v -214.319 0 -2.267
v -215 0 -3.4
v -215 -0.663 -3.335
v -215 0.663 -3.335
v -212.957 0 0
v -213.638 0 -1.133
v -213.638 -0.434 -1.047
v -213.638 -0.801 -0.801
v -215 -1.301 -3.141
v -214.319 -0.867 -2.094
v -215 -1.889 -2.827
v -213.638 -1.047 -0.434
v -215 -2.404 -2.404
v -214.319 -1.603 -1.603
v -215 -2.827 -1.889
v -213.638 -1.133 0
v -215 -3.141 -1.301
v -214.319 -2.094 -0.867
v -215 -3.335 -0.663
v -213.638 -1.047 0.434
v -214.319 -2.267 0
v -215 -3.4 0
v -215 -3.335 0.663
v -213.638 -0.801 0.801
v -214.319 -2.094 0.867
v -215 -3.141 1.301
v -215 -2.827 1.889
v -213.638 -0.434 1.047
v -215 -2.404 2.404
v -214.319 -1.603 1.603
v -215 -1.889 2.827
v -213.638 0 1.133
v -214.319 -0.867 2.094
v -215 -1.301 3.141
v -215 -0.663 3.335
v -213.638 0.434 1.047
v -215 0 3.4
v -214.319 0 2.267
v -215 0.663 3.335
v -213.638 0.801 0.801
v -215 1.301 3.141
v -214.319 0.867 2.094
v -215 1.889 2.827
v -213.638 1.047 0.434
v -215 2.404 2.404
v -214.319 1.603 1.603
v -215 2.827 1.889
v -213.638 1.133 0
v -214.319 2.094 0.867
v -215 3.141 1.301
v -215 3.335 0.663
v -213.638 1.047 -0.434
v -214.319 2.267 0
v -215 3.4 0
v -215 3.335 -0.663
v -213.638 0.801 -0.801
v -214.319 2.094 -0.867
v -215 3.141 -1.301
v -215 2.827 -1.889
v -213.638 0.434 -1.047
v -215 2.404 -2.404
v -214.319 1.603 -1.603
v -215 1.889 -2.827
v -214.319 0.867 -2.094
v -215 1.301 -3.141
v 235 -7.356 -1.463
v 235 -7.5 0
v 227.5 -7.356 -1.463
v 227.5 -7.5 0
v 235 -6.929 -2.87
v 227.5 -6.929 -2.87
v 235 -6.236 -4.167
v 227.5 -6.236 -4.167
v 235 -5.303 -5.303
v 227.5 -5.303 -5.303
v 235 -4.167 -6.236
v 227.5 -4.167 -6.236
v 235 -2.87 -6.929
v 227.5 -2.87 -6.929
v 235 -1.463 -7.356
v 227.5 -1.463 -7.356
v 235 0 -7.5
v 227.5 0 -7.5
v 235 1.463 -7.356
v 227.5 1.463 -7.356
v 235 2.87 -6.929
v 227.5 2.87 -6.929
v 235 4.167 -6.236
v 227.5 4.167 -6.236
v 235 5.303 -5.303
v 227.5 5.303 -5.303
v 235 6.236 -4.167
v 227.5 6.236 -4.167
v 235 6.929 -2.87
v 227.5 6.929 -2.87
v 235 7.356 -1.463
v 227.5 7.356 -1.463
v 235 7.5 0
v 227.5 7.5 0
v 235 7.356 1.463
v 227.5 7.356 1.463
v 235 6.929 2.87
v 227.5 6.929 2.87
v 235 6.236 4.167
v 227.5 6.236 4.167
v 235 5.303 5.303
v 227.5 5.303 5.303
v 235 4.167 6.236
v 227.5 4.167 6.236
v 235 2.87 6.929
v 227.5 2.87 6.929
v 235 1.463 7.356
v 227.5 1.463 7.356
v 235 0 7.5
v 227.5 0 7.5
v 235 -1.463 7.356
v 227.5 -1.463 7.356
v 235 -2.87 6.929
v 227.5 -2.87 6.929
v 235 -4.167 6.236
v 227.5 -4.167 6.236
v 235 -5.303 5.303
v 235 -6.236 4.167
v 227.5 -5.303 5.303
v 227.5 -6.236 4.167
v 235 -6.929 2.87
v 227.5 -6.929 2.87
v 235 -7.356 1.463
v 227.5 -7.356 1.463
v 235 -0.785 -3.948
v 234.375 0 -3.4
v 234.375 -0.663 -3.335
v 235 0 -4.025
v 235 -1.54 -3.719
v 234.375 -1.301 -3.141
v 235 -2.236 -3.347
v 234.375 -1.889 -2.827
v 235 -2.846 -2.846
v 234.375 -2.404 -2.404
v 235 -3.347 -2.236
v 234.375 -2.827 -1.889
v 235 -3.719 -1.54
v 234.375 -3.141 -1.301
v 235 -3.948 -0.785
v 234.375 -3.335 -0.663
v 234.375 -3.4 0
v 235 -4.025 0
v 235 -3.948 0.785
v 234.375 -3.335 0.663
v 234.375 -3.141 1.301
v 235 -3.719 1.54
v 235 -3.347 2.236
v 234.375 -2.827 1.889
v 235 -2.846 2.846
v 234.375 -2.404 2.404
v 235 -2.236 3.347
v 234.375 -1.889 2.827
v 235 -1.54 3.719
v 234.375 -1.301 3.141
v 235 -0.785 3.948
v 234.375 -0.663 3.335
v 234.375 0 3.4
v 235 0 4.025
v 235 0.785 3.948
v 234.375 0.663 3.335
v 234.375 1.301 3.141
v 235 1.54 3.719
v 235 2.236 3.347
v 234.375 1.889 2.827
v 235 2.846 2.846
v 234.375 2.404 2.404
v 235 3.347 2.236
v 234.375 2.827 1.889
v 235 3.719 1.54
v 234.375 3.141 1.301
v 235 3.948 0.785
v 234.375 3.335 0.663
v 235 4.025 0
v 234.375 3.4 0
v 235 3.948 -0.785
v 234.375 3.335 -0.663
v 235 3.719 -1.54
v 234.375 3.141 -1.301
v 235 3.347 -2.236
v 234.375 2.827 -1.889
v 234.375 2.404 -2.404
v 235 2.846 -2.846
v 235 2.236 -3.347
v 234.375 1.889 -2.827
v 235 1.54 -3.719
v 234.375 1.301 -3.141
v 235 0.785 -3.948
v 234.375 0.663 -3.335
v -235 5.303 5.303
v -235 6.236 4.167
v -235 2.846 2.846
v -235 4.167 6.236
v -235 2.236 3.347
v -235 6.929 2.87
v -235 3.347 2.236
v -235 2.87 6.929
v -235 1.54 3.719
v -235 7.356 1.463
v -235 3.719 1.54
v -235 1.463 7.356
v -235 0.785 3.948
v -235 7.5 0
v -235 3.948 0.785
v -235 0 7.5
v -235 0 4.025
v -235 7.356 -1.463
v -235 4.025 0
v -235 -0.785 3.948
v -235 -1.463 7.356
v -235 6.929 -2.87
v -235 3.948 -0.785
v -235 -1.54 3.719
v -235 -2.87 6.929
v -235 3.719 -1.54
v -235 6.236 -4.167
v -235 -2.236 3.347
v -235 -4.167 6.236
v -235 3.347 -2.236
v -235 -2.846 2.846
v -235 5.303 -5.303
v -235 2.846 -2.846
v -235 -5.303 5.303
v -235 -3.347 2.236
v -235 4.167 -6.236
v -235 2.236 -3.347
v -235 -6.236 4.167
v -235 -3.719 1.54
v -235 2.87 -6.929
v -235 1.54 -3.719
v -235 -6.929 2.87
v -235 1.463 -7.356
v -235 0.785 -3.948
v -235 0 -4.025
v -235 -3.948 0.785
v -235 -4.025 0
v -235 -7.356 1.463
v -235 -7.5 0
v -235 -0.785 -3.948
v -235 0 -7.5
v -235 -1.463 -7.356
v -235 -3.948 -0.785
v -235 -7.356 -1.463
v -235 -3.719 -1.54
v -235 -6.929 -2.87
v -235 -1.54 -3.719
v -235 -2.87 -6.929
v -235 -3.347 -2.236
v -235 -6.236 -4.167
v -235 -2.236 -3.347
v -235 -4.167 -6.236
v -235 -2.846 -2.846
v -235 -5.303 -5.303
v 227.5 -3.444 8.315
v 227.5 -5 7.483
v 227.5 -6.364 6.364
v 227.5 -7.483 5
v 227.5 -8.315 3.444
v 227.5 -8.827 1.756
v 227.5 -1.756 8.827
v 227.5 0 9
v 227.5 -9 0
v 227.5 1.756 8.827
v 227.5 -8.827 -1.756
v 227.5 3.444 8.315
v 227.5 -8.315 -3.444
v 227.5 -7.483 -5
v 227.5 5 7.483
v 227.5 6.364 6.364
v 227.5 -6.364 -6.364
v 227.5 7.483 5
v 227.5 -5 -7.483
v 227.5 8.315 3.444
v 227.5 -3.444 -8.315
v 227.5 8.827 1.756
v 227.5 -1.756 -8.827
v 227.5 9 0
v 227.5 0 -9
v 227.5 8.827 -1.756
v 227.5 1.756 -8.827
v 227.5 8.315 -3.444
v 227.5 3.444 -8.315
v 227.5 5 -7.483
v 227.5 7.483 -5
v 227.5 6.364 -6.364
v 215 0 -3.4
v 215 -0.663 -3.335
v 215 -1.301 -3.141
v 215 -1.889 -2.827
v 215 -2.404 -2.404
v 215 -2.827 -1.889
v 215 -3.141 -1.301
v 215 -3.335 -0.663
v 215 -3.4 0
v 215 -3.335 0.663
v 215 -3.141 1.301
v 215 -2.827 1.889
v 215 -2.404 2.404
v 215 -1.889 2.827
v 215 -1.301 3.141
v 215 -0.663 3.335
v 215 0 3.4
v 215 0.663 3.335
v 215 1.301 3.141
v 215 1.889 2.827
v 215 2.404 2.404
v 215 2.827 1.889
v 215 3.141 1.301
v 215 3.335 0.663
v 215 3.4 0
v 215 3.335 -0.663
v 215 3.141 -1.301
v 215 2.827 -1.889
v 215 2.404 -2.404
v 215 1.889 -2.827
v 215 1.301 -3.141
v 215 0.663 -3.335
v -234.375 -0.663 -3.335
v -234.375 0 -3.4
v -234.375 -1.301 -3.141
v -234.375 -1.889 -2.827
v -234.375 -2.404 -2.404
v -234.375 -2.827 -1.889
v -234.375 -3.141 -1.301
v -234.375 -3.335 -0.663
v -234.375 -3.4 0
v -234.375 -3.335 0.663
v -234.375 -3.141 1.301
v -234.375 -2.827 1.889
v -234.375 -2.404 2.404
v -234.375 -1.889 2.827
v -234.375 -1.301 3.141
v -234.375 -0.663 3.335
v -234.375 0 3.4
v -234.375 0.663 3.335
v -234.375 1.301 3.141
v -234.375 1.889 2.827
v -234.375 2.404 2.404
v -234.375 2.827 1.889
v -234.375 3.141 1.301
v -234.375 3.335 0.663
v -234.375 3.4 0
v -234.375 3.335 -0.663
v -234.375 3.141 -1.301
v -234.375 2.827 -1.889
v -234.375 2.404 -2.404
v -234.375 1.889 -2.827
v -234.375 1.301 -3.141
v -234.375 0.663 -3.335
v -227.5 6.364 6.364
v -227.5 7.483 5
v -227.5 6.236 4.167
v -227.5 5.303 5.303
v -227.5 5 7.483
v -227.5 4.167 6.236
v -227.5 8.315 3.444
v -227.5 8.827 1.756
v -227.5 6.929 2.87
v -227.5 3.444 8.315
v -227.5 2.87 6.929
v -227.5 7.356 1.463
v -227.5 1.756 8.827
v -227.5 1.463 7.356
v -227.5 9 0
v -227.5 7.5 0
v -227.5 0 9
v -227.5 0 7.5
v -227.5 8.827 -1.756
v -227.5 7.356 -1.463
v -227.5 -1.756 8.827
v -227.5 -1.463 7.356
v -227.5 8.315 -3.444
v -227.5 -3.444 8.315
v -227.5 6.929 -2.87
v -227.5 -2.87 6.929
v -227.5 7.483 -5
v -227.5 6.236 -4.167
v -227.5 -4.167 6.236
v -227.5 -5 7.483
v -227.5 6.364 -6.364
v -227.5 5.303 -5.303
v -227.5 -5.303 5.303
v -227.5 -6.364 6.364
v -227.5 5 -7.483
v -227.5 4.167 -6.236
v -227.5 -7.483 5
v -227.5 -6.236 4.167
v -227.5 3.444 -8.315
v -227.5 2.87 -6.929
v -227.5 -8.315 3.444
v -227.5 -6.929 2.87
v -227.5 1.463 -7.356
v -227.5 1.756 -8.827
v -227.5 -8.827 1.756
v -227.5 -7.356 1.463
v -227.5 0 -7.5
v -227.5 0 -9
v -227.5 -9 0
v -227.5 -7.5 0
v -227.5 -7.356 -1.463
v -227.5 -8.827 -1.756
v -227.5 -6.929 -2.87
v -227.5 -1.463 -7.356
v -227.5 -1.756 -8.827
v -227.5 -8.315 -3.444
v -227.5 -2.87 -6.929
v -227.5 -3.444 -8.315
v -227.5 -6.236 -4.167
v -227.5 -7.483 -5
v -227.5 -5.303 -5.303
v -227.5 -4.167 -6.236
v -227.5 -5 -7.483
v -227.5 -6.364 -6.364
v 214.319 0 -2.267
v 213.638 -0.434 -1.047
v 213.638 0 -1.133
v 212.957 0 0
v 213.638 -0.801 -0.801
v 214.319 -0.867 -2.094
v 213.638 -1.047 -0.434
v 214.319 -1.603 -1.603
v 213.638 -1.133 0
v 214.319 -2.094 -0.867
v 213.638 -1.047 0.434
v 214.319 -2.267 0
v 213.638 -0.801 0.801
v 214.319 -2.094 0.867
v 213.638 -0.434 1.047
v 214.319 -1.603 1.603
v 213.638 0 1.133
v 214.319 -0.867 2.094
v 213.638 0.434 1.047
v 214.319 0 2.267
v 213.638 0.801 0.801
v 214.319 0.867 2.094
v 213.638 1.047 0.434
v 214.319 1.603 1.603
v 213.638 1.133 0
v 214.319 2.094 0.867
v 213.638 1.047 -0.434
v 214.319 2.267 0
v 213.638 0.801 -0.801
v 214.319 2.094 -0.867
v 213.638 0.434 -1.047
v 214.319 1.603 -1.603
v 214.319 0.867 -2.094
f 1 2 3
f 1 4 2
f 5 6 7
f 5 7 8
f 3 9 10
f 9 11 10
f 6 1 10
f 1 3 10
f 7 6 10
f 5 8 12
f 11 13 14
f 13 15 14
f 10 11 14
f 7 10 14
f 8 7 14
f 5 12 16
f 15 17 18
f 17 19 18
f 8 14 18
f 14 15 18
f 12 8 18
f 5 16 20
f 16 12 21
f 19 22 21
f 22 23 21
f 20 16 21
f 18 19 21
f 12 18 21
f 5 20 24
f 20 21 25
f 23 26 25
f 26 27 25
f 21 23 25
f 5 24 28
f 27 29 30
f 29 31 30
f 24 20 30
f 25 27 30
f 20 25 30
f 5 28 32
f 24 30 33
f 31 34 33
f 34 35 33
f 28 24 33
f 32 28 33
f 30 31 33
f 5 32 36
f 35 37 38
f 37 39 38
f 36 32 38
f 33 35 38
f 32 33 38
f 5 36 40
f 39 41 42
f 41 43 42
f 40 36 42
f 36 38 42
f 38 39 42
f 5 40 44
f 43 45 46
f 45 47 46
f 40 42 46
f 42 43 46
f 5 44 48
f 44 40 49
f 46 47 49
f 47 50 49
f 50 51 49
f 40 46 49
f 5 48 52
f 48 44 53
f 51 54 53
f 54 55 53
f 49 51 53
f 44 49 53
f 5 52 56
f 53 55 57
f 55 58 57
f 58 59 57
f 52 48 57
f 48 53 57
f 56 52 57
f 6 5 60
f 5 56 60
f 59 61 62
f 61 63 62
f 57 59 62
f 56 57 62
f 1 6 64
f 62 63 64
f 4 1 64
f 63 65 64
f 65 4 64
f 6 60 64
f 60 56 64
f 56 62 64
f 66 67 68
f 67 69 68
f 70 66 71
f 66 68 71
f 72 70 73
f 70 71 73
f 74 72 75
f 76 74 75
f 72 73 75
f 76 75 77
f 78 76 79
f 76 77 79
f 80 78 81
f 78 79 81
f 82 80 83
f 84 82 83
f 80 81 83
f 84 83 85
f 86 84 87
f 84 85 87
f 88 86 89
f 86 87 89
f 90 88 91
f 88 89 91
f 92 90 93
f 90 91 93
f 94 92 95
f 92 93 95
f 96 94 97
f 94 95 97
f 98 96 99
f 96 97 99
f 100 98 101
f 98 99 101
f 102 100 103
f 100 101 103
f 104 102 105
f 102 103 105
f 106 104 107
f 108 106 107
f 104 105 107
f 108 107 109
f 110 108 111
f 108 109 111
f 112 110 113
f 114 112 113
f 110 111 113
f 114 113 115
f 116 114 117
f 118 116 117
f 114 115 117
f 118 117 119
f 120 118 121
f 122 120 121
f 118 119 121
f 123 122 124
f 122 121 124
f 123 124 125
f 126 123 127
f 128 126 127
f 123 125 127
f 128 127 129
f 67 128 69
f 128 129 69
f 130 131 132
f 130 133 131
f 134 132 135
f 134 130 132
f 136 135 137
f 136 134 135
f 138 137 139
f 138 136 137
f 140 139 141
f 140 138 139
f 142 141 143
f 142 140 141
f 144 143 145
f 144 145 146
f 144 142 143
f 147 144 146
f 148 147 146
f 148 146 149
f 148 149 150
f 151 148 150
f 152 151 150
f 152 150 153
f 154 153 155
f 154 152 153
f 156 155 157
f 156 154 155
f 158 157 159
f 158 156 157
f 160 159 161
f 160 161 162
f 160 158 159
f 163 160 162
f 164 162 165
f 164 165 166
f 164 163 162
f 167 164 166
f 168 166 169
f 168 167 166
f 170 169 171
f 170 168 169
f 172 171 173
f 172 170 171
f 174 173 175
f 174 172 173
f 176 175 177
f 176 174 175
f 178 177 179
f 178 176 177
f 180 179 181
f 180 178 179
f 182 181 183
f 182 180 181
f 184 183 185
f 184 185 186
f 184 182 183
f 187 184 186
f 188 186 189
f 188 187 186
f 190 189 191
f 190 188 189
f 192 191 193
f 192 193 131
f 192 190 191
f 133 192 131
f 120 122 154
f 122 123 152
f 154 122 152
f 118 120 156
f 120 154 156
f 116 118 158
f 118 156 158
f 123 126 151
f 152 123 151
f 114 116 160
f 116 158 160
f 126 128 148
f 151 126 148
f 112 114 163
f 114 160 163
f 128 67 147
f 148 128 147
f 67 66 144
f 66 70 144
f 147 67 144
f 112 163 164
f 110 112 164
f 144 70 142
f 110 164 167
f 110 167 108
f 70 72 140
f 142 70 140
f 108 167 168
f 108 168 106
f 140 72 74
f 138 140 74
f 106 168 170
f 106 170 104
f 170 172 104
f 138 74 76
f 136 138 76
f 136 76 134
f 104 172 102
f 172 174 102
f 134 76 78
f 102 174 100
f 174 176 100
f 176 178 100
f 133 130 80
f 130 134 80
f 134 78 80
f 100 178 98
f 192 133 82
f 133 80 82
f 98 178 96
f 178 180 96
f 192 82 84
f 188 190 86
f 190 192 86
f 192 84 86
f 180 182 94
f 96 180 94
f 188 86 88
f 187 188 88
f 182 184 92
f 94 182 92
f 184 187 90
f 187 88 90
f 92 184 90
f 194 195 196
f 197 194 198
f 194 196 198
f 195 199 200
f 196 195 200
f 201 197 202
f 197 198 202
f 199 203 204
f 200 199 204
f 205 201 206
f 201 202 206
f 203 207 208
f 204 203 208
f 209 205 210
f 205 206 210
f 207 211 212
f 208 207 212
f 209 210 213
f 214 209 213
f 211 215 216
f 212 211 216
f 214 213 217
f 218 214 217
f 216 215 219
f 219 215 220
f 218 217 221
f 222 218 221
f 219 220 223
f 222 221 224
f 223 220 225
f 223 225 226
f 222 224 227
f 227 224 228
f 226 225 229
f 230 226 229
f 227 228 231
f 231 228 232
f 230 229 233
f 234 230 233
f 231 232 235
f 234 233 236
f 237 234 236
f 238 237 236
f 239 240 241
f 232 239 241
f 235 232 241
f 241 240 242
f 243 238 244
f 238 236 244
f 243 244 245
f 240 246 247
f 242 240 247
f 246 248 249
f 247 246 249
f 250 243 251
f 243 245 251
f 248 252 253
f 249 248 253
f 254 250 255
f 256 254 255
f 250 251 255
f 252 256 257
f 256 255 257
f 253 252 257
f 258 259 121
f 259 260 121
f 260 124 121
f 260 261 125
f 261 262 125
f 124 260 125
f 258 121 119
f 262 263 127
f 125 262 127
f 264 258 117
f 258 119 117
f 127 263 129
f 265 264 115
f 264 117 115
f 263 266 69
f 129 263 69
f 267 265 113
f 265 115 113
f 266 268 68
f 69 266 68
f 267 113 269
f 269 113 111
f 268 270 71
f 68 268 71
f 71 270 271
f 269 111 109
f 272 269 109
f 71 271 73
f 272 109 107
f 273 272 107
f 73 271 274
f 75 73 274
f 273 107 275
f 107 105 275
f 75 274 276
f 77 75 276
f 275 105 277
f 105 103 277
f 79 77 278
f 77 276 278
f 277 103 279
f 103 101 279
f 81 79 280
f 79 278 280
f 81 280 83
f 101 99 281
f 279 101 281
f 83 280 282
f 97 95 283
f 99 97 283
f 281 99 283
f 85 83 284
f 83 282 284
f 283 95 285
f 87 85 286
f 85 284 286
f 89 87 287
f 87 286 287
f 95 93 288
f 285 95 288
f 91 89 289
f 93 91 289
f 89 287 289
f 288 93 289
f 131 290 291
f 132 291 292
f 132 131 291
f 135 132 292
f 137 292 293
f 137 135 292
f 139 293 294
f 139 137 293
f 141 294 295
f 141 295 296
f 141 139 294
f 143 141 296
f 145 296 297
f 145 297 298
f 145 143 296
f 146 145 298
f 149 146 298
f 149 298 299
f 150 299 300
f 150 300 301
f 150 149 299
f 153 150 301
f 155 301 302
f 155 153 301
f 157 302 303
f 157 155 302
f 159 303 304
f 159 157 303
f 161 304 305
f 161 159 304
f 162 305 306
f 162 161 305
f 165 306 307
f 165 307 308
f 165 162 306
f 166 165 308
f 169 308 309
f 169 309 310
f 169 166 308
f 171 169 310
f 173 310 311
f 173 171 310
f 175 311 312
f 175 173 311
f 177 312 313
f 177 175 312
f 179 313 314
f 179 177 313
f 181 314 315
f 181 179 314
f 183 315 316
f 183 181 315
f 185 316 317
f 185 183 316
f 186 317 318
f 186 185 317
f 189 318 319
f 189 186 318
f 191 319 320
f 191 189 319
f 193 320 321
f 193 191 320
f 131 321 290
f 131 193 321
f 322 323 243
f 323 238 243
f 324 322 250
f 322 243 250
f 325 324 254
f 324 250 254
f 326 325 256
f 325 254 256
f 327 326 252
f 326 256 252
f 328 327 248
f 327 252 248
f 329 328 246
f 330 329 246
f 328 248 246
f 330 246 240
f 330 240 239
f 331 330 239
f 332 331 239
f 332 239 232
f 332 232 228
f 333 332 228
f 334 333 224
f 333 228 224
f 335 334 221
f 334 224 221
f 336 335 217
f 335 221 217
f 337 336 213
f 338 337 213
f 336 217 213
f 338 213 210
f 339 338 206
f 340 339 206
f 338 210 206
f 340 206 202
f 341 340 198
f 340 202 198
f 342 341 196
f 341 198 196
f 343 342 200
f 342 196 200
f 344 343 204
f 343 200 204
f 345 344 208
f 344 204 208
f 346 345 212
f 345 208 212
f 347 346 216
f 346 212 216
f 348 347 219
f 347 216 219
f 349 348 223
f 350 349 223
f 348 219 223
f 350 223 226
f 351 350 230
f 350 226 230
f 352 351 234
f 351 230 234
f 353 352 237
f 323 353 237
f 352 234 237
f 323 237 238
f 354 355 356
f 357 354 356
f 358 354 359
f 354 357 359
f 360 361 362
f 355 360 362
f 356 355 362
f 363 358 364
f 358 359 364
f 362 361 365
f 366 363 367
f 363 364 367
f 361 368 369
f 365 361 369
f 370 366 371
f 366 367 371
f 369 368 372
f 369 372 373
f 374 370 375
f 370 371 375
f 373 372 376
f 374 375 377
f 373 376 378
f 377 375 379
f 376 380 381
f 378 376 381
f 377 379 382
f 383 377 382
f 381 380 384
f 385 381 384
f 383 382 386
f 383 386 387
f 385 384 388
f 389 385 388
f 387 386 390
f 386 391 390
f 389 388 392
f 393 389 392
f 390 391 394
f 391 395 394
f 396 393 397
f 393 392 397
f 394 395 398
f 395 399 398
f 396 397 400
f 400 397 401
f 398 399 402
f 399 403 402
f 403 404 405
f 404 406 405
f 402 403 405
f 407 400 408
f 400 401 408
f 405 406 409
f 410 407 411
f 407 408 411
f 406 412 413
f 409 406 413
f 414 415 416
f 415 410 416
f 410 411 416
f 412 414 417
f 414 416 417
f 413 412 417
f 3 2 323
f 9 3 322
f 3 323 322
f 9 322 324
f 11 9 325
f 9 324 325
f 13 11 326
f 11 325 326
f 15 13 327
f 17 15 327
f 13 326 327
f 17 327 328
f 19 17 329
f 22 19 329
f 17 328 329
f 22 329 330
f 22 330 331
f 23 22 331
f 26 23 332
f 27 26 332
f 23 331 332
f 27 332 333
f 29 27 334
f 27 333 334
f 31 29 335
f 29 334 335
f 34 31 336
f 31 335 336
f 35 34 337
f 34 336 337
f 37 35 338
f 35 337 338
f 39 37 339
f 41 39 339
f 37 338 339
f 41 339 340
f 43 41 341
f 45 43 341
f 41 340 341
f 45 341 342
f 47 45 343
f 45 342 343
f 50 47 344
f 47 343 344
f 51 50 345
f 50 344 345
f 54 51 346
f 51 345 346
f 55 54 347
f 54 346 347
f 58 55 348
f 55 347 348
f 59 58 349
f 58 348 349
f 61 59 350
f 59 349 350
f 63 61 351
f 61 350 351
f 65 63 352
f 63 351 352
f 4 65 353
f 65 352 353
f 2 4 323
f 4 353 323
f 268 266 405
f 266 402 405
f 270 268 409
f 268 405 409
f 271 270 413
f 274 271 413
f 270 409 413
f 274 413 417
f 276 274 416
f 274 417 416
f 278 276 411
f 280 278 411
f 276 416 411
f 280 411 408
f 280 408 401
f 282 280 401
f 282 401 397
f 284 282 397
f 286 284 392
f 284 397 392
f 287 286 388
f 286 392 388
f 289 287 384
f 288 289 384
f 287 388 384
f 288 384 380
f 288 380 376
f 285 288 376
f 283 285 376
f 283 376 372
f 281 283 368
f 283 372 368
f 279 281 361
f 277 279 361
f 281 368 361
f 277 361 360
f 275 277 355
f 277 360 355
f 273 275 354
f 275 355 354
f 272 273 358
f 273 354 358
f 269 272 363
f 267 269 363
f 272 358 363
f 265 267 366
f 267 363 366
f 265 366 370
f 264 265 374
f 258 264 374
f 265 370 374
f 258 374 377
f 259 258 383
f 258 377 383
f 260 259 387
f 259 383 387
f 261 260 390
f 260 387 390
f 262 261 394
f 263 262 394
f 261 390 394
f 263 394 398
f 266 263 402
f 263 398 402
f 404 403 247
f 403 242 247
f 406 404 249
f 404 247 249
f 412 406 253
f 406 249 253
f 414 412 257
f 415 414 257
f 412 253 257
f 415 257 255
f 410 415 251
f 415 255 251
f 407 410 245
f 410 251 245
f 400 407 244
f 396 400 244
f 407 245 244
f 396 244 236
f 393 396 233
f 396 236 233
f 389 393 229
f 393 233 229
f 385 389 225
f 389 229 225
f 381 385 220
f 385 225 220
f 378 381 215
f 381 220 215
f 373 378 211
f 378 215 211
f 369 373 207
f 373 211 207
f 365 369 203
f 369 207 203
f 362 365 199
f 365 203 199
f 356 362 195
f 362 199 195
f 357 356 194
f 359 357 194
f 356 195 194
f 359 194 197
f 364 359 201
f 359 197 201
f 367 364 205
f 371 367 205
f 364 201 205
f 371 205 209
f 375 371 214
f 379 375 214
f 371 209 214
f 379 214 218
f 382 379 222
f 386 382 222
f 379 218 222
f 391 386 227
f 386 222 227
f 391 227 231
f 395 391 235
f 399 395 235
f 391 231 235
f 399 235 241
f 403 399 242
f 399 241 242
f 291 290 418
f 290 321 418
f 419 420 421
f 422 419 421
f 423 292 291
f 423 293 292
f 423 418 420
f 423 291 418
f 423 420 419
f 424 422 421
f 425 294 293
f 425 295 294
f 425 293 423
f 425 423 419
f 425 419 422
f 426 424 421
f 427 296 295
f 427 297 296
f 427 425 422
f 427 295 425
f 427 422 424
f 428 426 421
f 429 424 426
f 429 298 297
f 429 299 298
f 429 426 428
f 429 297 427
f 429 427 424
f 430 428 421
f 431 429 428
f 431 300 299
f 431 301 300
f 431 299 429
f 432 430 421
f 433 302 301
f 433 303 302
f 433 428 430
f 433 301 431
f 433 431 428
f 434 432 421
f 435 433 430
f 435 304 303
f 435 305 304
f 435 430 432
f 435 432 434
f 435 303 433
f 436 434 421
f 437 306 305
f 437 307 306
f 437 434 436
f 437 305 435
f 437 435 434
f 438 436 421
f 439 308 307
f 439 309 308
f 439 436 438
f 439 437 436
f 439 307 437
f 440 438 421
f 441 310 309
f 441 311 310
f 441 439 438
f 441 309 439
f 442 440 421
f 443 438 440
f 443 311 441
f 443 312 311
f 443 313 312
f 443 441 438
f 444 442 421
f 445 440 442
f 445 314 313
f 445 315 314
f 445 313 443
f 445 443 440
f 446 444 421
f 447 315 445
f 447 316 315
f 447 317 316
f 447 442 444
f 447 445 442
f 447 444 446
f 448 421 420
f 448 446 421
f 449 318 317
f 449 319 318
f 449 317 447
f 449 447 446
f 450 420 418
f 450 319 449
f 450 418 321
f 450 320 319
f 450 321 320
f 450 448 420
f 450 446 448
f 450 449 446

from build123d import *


with BuildPart() as part:
    # Sketch1 → Revolve1 (revolve)
    with BuildSketch(Plane.XY, mode=Mode.PRIVATE) as revolve1_sk:
        Polygon((-235, 0), (235, 0), (235, 7.5), (227.5, 7.5), (227.5, 9), (-227.5, 9), (-227.5, 7.5), (-235, 7.5), align=None)
    revolve(revolve1_sk.sketch.rotate(Axis((-235, 0, 0), (1, 0, 0)), 180), axis=Axis((-235, 0, 0), (1, 0, 0)))

    # Sketch5 → M8 Tapped Hole2 (revolve, cut)
    with BuildSketch(Plane(origin=(235, 0, 0), x_dir=(0, 0, -1), z_dir=(0, 1, 0))):
        Polygon((0, 0), (0, 22.042926105), (3.4, 20), (3.4, 0.625), (4.025, 0), align=None)
    m8_tapped_hole2 = revolve(axis=Axis((241.35, 0, 0), (-1, 0, 0)), mode=Mode.SUBTRACT)

    # Mirror1: M8 Tapped Hole2 across plane
    add(m8_tapped_hole2.mirror(Plane(origin=(0, 0, 0), x_dir=(0, 0, 1), z_dir=(1, 0, 0))), mode=Mode.SUBTRACT)


solid = part.part
